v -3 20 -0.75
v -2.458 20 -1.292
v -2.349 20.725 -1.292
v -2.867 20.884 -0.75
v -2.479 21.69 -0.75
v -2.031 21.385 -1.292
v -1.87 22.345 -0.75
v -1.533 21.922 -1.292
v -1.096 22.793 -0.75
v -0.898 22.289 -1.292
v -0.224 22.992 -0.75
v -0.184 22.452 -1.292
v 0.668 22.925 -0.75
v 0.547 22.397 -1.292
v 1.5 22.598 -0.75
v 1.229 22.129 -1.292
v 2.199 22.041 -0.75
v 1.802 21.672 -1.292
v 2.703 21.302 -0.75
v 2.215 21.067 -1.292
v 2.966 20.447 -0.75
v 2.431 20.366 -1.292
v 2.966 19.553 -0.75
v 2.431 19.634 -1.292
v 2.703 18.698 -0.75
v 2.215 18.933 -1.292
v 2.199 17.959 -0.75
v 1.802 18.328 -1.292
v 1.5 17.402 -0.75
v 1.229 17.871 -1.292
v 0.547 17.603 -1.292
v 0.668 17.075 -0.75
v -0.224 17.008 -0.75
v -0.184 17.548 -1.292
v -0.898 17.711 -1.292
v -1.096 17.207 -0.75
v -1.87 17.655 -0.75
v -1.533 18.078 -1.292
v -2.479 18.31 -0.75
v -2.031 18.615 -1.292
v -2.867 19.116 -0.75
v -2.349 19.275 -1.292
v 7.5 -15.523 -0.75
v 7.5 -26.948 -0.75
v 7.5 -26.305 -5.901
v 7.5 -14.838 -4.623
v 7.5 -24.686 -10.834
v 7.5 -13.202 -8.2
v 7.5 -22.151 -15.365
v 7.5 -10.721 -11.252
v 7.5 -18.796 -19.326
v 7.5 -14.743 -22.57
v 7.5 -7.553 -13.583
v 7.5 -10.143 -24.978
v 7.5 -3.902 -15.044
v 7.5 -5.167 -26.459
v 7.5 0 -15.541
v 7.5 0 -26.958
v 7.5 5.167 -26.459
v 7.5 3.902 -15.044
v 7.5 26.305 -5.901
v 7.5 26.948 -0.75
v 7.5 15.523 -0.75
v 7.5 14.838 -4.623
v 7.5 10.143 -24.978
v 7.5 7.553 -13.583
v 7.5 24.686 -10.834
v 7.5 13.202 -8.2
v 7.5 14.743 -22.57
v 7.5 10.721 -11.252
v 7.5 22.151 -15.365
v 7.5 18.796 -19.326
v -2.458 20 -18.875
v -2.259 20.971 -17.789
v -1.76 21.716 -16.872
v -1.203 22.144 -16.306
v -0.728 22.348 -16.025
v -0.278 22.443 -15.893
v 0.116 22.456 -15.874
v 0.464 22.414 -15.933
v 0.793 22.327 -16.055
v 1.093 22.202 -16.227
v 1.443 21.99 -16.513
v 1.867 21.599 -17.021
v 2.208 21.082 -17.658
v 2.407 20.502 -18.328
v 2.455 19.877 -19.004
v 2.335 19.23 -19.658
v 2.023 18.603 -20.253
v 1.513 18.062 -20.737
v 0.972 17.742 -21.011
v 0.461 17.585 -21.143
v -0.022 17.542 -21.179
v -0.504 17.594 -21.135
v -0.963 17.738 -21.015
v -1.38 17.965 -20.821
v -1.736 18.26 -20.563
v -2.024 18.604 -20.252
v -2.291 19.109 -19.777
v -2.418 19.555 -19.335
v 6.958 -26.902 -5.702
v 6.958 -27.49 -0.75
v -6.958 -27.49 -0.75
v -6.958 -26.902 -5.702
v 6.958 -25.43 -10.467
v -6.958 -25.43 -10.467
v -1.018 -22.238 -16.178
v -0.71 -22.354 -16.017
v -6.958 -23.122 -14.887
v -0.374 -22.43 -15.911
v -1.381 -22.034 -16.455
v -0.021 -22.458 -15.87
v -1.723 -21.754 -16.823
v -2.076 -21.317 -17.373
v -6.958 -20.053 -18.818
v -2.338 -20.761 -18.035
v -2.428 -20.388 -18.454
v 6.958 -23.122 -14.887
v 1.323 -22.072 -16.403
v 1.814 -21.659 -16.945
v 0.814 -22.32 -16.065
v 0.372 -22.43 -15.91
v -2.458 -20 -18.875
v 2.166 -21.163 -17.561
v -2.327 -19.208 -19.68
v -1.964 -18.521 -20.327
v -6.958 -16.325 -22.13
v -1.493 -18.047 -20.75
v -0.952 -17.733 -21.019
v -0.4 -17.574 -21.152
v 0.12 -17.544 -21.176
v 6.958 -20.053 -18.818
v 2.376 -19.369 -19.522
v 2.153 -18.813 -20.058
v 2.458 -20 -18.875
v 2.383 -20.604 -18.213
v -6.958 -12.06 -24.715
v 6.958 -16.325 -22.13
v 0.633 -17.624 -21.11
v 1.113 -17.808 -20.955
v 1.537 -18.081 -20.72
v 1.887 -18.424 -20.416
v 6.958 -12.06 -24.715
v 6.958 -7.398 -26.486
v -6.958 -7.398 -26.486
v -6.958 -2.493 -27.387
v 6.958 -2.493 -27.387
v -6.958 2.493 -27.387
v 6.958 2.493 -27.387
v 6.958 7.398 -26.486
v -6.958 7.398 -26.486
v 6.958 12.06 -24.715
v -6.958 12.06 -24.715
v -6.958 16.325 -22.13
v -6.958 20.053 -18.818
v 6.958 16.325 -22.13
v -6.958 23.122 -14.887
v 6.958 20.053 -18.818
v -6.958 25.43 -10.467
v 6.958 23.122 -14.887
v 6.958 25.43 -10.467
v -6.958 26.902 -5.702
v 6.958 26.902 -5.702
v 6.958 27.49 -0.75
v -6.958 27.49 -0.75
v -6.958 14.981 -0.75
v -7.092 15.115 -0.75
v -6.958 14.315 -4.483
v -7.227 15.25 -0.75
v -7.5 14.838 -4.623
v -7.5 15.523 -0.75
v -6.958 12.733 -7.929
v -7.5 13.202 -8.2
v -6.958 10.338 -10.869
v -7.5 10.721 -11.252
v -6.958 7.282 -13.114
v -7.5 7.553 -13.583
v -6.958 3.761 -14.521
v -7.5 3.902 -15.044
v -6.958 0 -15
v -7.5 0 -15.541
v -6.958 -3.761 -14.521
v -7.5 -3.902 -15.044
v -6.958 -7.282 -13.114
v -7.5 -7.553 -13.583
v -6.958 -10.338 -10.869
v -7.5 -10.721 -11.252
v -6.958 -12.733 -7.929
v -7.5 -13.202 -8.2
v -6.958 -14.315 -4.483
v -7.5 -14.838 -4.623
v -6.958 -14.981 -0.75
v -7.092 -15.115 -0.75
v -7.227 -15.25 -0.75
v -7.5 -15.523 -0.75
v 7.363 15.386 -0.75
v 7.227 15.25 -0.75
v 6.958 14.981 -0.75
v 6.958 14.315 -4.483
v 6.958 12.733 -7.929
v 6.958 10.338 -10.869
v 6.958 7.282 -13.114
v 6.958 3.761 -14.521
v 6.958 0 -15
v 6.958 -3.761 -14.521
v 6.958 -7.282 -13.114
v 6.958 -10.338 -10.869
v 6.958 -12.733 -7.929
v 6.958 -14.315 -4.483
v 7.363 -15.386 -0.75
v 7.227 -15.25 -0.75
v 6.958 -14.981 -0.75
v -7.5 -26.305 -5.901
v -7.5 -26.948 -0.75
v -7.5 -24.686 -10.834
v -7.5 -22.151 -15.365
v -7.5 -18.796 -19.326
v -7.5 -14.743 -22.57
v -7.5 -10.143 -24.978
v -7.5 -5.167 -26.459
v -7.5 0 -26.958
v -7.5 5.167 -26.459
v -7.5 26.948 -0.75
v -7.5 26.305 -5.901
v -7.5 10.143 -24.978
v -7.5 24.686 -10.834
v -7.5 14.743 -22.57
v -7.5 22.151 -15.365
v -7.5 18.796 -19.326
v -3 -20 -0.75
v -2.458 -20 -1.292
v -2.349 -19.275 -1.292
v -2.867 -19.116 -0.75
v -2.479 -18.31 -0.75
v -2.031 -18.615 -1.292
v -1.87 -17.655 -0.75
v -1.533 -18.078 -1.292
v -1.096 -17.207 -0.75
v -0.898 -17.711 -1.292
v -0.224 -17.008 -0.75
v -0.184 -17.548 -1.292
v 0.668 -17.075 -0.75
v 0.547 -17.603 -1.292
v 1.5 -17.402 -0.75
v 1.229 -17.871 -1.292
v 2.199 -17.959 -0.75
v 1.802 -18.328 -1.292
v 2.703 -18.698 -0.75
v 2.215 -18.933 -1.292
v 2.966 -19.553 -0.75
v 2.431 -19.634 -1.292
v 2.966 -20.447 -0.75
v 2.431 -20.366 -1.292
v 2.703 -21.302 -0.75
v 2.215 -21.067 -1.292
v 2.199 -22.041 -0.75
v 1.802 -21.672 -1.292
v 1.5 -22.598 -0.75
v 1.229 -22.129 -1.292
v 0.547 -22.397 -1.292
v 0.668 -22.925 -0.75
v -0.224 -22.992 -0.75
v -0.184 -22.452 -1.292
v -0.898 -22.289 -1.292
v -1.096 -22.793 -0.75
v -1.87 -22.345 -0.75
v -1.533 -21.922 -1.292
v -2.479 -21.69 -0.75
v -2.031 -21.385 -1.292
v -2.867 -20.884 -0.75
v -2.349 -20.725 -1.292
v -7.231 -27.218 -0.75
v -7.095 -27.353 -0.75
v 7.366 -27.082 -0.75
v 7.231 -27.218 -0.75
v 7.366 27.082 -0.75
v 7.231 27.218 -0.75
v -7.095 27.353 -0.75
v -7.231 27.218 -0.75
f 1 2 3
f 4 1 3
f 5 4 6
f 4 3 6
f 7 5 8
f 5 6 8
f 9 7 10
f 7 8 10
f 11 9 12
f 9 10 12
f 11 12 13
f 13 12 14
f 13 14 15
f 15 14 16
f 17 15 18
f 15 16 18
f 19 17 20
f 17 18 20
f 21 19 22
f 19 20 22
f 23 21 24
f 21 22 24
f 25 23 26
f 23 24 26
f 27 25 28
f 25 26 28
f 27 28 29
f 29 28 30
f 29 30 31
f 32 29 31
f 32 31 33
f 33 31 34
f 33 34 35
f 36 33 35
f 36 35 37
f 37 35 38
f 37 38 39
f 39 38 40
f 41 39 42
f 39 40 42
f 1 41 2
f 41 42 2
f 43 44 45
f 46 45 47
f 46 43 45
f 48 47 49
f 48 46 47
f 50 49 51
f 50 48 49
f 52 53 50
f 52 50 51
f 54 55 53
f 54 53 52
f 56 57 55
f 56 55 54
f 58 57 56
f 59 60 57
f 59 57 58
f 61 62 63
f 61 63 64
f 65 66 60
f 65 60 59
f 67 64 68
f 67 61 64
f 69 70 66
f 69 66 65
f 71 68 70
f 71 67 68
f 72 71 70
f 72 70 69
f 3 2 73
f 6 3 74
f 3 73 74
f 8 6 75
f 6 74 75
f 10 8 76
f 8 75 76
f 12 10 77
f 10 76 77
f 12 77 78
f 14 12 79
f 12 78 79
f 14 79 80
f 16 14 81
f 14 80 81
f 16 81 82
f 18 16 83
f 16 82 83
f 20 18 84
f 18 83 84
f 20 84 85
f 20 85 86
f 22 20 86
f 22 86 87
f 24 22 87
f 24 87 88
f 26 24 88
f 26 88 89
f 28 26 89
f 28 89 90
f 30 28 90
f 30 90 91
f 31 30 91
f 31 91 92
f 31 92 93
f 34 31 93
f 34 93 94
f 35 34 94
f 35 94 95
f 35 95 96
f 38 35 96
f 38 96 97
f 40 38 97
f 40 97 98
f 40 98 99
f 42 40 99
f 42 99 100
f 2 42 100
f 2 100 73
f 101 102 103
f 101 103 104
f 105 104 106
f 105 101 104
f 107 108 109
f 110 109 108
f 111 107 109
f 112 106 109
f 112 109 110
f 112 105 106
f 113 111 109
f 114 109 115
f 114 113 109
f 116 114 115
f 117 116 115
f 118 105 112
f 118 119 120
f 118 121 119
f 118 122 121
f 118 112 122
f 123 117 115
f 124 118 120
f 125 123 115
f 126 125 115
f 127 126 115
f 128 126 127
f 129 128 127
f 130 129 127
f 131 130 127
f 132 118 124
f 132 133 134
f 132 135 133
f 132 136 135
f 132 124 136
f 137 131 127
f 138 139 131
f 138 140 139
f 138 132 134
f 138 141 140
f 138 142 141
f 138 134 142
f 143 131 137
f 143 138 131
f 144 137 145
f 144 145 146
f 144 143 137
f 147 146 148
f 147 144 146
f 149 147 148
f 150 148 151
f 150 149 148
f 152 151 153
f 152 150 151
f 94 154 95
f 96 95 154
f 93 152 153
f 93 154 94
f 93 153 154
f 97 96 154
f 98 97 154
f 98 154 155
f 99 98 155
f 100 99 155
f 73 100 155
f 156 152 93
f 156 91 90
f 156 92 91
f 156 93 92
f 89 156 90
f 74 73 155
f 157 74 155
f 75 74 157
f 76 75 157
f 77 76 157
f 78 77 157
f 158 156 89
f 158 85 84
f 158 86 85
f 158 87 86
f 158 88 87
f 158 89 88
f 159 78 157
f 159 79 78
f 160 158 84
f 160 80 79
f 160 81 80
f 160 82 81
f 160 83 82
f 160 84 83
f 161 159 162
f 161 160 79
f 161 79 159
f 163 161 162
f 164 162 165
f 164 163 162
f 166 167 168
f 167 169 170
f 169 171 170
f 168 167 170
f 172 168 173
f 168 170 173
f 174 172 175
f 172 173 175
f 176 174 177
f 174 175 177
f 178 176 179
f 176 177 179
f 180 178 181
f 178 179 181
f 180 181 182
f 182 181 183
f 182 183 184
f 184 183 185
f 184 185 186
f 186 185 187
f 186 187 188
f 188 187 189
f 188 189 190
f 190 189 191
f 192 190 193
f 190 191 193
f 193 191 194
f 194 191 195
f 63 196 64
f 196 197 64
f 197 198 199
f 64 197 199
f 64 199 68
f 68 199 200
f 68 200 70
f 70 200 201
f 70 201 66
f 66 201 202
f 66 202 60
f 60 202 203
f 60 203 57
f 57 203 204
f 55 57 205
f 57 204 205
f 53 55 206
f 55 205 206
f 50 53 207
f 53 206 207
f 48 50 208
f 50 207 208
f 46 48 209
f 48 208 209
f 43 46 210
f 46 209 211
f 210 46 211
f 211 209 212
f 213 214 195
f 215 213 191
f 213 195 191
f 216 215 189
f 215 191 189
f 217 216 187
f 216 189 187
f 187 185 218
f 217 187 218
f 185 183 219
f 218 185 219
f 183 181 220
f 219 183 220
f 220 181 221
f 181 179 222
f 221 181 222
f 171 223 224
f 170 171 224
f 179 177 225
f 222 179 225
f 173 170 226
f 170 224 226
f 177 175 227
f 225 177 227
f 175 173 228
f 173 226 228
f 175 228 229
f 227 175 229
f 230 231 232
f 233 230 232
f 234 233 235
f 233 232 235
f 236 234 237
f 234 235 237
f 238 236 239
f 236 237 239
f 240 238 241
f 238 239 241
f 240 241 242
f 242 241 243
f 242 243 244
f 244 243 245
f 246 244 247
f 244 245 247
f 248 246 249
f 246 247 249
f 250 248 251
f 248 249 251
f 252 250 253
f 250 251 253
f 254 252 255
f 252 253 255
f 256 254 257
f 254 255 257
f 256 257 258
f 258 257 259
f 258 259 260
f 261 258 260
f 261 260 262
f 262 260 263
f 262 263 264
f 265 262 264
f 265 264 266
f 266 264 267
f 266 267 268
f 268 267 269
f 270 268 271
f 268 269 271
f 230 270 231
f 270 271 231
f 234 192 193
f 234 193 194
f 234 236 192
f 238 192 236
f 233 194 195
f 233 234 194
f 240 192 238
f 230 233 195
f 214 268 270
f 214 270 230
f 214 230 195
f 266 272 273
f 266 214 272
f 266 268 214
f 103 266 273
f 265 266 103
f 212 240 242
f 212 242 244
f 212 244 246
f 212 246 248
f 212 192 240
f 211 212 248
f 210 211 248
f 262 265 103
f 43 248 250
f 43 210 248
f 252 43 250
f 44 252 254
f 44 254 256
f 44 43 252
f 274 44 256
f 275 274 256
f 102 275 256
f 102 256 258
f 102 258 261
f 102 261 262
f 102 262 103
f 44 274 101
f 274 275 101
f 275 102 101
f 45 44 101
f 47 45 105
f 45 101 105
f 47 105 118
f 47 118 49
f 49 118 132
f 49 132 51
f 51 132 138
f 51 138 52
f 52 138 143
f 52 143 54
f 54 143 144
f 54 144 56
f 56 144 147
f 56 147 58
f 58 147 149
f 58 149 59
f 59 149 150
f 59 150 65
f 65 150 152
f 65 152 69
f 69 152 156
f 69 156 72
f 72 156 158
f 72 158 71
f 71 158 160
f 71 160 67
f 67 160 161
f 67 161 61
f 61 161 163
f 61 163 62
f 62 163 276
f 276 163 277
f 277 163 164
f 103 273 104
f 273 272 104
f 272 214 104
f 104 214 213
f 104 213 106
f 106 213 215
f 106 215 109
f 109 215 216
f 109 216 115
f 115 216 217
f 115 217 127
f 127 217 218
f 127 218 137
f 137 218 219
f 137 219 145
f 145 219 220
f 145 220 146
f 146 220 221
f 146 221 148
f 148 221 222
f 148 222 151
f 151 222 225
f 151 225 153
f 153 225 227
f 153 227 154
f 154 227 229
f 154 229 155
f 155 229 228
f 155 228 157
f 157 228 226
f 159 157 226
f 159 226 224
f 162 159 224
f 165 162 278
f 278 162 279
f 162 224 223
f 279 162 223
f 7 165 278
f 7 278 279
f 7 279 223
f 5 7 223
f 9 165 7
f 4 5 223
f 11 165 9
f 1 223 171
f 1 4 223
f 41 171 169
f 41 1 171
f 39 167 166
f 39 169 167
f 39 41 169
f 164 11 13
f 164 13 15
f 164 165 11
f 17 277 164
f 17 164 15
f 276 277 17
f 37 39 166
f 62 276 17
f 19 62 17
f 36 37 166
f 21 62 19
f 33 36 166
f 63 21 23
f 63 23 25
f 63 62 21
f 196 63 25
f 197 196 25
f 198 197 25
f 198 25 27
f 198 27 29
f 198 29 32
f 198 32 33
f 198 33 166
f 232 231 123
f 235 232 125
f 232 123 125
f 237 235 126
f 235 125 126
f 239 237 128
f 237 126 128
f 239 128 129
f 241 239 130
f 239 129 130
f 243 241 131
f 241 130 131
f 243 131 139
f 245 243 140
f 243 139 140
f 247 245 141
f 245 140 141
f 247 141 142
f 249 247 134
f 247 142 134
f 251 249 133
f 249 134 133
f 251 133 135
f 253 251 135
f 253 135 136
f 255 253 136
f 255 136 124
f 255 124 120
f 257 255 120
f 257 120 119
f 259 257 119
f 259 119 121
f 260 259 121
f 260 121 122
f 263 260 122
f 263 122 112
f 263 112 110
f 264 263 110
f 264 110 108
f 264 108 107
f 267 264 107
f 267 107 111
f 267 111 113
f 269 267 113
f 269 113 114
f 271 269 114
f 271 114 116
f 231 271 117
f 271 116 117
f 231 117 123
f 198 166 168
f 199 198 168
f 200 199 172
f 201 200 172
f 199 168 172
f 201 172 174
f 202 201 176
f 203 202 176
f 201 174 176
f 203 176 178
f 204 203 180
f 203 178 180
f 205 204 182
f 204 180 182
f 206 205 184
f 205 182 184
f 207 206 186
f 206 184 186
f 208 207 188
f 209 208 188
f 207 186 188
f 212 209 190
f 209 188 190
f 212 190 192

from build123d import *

# Parameters (mm, degrees)
BOSS_EXTRUDE1_DEPTH = 15
CUT_EXTRUDE1_DEPTH  = 42.676582154
HOLE1_D             = 4.917
HOLE1_DEPTH         = 26.75
CHAMFER1_SIZE       = 0.5415


with BuildPart() as part:
    # Sketch1 → Boss-Extrude1 (new body)
    with BuildSketch(Plane(origin=(7.5, 0, 0), x_dir=(0, 0, -1), z_dir=(1, 0, 0))):
        with BuildLine():
            Line((0.75, 27.489770825), (0.75, -27.489770825))
            ThreePointArc((0.75, -27.489770825), (27.5, 0), (0.75, 27.489770825))
        make_face()
    extrude(amount=-BOSS_EXTRUDE1_DEPTH)

    # Sketch2 → Cut-Extrude1 (cut, through all)
    with BuildSketch(Plane.ZY.offset(7.5)):
        with BuildLine():
            Line((-0.75, -14.981238267), (-0.75, 14.981238267))
            ThreePointArc((-0.75, 14.981238267), (-15, 0), (-0.75, -14.981238267))
        make_face()
    extrude(amount=-CUT_EXTRUDE1_DEPTH, mode=Mode.SUBTRACT)

    # Hole1
    with Locations(Plane.XY.offset(-0.75)):
        with Locations((0, -20), (0, 20)):
            Hole(HOLE1_D / 2, depth=HOLE1_DEPTH)

    # Chamfer1
    chamfer1_edges = [part.edges().sort_by_distance(p)[0] for p in [
        (7.5, 0, -15),
        (-7.5, 0, -15),
        (2.4585, 20, -0.75),
        (2.4585, -20, -0.75),
        (7.5, 0, -27.5),
        (-7.5, 0, -27.5),
    ]]
    chamfer(chamfer1_edges, length=CHAMFER1_SIZE)


solid = part.part
